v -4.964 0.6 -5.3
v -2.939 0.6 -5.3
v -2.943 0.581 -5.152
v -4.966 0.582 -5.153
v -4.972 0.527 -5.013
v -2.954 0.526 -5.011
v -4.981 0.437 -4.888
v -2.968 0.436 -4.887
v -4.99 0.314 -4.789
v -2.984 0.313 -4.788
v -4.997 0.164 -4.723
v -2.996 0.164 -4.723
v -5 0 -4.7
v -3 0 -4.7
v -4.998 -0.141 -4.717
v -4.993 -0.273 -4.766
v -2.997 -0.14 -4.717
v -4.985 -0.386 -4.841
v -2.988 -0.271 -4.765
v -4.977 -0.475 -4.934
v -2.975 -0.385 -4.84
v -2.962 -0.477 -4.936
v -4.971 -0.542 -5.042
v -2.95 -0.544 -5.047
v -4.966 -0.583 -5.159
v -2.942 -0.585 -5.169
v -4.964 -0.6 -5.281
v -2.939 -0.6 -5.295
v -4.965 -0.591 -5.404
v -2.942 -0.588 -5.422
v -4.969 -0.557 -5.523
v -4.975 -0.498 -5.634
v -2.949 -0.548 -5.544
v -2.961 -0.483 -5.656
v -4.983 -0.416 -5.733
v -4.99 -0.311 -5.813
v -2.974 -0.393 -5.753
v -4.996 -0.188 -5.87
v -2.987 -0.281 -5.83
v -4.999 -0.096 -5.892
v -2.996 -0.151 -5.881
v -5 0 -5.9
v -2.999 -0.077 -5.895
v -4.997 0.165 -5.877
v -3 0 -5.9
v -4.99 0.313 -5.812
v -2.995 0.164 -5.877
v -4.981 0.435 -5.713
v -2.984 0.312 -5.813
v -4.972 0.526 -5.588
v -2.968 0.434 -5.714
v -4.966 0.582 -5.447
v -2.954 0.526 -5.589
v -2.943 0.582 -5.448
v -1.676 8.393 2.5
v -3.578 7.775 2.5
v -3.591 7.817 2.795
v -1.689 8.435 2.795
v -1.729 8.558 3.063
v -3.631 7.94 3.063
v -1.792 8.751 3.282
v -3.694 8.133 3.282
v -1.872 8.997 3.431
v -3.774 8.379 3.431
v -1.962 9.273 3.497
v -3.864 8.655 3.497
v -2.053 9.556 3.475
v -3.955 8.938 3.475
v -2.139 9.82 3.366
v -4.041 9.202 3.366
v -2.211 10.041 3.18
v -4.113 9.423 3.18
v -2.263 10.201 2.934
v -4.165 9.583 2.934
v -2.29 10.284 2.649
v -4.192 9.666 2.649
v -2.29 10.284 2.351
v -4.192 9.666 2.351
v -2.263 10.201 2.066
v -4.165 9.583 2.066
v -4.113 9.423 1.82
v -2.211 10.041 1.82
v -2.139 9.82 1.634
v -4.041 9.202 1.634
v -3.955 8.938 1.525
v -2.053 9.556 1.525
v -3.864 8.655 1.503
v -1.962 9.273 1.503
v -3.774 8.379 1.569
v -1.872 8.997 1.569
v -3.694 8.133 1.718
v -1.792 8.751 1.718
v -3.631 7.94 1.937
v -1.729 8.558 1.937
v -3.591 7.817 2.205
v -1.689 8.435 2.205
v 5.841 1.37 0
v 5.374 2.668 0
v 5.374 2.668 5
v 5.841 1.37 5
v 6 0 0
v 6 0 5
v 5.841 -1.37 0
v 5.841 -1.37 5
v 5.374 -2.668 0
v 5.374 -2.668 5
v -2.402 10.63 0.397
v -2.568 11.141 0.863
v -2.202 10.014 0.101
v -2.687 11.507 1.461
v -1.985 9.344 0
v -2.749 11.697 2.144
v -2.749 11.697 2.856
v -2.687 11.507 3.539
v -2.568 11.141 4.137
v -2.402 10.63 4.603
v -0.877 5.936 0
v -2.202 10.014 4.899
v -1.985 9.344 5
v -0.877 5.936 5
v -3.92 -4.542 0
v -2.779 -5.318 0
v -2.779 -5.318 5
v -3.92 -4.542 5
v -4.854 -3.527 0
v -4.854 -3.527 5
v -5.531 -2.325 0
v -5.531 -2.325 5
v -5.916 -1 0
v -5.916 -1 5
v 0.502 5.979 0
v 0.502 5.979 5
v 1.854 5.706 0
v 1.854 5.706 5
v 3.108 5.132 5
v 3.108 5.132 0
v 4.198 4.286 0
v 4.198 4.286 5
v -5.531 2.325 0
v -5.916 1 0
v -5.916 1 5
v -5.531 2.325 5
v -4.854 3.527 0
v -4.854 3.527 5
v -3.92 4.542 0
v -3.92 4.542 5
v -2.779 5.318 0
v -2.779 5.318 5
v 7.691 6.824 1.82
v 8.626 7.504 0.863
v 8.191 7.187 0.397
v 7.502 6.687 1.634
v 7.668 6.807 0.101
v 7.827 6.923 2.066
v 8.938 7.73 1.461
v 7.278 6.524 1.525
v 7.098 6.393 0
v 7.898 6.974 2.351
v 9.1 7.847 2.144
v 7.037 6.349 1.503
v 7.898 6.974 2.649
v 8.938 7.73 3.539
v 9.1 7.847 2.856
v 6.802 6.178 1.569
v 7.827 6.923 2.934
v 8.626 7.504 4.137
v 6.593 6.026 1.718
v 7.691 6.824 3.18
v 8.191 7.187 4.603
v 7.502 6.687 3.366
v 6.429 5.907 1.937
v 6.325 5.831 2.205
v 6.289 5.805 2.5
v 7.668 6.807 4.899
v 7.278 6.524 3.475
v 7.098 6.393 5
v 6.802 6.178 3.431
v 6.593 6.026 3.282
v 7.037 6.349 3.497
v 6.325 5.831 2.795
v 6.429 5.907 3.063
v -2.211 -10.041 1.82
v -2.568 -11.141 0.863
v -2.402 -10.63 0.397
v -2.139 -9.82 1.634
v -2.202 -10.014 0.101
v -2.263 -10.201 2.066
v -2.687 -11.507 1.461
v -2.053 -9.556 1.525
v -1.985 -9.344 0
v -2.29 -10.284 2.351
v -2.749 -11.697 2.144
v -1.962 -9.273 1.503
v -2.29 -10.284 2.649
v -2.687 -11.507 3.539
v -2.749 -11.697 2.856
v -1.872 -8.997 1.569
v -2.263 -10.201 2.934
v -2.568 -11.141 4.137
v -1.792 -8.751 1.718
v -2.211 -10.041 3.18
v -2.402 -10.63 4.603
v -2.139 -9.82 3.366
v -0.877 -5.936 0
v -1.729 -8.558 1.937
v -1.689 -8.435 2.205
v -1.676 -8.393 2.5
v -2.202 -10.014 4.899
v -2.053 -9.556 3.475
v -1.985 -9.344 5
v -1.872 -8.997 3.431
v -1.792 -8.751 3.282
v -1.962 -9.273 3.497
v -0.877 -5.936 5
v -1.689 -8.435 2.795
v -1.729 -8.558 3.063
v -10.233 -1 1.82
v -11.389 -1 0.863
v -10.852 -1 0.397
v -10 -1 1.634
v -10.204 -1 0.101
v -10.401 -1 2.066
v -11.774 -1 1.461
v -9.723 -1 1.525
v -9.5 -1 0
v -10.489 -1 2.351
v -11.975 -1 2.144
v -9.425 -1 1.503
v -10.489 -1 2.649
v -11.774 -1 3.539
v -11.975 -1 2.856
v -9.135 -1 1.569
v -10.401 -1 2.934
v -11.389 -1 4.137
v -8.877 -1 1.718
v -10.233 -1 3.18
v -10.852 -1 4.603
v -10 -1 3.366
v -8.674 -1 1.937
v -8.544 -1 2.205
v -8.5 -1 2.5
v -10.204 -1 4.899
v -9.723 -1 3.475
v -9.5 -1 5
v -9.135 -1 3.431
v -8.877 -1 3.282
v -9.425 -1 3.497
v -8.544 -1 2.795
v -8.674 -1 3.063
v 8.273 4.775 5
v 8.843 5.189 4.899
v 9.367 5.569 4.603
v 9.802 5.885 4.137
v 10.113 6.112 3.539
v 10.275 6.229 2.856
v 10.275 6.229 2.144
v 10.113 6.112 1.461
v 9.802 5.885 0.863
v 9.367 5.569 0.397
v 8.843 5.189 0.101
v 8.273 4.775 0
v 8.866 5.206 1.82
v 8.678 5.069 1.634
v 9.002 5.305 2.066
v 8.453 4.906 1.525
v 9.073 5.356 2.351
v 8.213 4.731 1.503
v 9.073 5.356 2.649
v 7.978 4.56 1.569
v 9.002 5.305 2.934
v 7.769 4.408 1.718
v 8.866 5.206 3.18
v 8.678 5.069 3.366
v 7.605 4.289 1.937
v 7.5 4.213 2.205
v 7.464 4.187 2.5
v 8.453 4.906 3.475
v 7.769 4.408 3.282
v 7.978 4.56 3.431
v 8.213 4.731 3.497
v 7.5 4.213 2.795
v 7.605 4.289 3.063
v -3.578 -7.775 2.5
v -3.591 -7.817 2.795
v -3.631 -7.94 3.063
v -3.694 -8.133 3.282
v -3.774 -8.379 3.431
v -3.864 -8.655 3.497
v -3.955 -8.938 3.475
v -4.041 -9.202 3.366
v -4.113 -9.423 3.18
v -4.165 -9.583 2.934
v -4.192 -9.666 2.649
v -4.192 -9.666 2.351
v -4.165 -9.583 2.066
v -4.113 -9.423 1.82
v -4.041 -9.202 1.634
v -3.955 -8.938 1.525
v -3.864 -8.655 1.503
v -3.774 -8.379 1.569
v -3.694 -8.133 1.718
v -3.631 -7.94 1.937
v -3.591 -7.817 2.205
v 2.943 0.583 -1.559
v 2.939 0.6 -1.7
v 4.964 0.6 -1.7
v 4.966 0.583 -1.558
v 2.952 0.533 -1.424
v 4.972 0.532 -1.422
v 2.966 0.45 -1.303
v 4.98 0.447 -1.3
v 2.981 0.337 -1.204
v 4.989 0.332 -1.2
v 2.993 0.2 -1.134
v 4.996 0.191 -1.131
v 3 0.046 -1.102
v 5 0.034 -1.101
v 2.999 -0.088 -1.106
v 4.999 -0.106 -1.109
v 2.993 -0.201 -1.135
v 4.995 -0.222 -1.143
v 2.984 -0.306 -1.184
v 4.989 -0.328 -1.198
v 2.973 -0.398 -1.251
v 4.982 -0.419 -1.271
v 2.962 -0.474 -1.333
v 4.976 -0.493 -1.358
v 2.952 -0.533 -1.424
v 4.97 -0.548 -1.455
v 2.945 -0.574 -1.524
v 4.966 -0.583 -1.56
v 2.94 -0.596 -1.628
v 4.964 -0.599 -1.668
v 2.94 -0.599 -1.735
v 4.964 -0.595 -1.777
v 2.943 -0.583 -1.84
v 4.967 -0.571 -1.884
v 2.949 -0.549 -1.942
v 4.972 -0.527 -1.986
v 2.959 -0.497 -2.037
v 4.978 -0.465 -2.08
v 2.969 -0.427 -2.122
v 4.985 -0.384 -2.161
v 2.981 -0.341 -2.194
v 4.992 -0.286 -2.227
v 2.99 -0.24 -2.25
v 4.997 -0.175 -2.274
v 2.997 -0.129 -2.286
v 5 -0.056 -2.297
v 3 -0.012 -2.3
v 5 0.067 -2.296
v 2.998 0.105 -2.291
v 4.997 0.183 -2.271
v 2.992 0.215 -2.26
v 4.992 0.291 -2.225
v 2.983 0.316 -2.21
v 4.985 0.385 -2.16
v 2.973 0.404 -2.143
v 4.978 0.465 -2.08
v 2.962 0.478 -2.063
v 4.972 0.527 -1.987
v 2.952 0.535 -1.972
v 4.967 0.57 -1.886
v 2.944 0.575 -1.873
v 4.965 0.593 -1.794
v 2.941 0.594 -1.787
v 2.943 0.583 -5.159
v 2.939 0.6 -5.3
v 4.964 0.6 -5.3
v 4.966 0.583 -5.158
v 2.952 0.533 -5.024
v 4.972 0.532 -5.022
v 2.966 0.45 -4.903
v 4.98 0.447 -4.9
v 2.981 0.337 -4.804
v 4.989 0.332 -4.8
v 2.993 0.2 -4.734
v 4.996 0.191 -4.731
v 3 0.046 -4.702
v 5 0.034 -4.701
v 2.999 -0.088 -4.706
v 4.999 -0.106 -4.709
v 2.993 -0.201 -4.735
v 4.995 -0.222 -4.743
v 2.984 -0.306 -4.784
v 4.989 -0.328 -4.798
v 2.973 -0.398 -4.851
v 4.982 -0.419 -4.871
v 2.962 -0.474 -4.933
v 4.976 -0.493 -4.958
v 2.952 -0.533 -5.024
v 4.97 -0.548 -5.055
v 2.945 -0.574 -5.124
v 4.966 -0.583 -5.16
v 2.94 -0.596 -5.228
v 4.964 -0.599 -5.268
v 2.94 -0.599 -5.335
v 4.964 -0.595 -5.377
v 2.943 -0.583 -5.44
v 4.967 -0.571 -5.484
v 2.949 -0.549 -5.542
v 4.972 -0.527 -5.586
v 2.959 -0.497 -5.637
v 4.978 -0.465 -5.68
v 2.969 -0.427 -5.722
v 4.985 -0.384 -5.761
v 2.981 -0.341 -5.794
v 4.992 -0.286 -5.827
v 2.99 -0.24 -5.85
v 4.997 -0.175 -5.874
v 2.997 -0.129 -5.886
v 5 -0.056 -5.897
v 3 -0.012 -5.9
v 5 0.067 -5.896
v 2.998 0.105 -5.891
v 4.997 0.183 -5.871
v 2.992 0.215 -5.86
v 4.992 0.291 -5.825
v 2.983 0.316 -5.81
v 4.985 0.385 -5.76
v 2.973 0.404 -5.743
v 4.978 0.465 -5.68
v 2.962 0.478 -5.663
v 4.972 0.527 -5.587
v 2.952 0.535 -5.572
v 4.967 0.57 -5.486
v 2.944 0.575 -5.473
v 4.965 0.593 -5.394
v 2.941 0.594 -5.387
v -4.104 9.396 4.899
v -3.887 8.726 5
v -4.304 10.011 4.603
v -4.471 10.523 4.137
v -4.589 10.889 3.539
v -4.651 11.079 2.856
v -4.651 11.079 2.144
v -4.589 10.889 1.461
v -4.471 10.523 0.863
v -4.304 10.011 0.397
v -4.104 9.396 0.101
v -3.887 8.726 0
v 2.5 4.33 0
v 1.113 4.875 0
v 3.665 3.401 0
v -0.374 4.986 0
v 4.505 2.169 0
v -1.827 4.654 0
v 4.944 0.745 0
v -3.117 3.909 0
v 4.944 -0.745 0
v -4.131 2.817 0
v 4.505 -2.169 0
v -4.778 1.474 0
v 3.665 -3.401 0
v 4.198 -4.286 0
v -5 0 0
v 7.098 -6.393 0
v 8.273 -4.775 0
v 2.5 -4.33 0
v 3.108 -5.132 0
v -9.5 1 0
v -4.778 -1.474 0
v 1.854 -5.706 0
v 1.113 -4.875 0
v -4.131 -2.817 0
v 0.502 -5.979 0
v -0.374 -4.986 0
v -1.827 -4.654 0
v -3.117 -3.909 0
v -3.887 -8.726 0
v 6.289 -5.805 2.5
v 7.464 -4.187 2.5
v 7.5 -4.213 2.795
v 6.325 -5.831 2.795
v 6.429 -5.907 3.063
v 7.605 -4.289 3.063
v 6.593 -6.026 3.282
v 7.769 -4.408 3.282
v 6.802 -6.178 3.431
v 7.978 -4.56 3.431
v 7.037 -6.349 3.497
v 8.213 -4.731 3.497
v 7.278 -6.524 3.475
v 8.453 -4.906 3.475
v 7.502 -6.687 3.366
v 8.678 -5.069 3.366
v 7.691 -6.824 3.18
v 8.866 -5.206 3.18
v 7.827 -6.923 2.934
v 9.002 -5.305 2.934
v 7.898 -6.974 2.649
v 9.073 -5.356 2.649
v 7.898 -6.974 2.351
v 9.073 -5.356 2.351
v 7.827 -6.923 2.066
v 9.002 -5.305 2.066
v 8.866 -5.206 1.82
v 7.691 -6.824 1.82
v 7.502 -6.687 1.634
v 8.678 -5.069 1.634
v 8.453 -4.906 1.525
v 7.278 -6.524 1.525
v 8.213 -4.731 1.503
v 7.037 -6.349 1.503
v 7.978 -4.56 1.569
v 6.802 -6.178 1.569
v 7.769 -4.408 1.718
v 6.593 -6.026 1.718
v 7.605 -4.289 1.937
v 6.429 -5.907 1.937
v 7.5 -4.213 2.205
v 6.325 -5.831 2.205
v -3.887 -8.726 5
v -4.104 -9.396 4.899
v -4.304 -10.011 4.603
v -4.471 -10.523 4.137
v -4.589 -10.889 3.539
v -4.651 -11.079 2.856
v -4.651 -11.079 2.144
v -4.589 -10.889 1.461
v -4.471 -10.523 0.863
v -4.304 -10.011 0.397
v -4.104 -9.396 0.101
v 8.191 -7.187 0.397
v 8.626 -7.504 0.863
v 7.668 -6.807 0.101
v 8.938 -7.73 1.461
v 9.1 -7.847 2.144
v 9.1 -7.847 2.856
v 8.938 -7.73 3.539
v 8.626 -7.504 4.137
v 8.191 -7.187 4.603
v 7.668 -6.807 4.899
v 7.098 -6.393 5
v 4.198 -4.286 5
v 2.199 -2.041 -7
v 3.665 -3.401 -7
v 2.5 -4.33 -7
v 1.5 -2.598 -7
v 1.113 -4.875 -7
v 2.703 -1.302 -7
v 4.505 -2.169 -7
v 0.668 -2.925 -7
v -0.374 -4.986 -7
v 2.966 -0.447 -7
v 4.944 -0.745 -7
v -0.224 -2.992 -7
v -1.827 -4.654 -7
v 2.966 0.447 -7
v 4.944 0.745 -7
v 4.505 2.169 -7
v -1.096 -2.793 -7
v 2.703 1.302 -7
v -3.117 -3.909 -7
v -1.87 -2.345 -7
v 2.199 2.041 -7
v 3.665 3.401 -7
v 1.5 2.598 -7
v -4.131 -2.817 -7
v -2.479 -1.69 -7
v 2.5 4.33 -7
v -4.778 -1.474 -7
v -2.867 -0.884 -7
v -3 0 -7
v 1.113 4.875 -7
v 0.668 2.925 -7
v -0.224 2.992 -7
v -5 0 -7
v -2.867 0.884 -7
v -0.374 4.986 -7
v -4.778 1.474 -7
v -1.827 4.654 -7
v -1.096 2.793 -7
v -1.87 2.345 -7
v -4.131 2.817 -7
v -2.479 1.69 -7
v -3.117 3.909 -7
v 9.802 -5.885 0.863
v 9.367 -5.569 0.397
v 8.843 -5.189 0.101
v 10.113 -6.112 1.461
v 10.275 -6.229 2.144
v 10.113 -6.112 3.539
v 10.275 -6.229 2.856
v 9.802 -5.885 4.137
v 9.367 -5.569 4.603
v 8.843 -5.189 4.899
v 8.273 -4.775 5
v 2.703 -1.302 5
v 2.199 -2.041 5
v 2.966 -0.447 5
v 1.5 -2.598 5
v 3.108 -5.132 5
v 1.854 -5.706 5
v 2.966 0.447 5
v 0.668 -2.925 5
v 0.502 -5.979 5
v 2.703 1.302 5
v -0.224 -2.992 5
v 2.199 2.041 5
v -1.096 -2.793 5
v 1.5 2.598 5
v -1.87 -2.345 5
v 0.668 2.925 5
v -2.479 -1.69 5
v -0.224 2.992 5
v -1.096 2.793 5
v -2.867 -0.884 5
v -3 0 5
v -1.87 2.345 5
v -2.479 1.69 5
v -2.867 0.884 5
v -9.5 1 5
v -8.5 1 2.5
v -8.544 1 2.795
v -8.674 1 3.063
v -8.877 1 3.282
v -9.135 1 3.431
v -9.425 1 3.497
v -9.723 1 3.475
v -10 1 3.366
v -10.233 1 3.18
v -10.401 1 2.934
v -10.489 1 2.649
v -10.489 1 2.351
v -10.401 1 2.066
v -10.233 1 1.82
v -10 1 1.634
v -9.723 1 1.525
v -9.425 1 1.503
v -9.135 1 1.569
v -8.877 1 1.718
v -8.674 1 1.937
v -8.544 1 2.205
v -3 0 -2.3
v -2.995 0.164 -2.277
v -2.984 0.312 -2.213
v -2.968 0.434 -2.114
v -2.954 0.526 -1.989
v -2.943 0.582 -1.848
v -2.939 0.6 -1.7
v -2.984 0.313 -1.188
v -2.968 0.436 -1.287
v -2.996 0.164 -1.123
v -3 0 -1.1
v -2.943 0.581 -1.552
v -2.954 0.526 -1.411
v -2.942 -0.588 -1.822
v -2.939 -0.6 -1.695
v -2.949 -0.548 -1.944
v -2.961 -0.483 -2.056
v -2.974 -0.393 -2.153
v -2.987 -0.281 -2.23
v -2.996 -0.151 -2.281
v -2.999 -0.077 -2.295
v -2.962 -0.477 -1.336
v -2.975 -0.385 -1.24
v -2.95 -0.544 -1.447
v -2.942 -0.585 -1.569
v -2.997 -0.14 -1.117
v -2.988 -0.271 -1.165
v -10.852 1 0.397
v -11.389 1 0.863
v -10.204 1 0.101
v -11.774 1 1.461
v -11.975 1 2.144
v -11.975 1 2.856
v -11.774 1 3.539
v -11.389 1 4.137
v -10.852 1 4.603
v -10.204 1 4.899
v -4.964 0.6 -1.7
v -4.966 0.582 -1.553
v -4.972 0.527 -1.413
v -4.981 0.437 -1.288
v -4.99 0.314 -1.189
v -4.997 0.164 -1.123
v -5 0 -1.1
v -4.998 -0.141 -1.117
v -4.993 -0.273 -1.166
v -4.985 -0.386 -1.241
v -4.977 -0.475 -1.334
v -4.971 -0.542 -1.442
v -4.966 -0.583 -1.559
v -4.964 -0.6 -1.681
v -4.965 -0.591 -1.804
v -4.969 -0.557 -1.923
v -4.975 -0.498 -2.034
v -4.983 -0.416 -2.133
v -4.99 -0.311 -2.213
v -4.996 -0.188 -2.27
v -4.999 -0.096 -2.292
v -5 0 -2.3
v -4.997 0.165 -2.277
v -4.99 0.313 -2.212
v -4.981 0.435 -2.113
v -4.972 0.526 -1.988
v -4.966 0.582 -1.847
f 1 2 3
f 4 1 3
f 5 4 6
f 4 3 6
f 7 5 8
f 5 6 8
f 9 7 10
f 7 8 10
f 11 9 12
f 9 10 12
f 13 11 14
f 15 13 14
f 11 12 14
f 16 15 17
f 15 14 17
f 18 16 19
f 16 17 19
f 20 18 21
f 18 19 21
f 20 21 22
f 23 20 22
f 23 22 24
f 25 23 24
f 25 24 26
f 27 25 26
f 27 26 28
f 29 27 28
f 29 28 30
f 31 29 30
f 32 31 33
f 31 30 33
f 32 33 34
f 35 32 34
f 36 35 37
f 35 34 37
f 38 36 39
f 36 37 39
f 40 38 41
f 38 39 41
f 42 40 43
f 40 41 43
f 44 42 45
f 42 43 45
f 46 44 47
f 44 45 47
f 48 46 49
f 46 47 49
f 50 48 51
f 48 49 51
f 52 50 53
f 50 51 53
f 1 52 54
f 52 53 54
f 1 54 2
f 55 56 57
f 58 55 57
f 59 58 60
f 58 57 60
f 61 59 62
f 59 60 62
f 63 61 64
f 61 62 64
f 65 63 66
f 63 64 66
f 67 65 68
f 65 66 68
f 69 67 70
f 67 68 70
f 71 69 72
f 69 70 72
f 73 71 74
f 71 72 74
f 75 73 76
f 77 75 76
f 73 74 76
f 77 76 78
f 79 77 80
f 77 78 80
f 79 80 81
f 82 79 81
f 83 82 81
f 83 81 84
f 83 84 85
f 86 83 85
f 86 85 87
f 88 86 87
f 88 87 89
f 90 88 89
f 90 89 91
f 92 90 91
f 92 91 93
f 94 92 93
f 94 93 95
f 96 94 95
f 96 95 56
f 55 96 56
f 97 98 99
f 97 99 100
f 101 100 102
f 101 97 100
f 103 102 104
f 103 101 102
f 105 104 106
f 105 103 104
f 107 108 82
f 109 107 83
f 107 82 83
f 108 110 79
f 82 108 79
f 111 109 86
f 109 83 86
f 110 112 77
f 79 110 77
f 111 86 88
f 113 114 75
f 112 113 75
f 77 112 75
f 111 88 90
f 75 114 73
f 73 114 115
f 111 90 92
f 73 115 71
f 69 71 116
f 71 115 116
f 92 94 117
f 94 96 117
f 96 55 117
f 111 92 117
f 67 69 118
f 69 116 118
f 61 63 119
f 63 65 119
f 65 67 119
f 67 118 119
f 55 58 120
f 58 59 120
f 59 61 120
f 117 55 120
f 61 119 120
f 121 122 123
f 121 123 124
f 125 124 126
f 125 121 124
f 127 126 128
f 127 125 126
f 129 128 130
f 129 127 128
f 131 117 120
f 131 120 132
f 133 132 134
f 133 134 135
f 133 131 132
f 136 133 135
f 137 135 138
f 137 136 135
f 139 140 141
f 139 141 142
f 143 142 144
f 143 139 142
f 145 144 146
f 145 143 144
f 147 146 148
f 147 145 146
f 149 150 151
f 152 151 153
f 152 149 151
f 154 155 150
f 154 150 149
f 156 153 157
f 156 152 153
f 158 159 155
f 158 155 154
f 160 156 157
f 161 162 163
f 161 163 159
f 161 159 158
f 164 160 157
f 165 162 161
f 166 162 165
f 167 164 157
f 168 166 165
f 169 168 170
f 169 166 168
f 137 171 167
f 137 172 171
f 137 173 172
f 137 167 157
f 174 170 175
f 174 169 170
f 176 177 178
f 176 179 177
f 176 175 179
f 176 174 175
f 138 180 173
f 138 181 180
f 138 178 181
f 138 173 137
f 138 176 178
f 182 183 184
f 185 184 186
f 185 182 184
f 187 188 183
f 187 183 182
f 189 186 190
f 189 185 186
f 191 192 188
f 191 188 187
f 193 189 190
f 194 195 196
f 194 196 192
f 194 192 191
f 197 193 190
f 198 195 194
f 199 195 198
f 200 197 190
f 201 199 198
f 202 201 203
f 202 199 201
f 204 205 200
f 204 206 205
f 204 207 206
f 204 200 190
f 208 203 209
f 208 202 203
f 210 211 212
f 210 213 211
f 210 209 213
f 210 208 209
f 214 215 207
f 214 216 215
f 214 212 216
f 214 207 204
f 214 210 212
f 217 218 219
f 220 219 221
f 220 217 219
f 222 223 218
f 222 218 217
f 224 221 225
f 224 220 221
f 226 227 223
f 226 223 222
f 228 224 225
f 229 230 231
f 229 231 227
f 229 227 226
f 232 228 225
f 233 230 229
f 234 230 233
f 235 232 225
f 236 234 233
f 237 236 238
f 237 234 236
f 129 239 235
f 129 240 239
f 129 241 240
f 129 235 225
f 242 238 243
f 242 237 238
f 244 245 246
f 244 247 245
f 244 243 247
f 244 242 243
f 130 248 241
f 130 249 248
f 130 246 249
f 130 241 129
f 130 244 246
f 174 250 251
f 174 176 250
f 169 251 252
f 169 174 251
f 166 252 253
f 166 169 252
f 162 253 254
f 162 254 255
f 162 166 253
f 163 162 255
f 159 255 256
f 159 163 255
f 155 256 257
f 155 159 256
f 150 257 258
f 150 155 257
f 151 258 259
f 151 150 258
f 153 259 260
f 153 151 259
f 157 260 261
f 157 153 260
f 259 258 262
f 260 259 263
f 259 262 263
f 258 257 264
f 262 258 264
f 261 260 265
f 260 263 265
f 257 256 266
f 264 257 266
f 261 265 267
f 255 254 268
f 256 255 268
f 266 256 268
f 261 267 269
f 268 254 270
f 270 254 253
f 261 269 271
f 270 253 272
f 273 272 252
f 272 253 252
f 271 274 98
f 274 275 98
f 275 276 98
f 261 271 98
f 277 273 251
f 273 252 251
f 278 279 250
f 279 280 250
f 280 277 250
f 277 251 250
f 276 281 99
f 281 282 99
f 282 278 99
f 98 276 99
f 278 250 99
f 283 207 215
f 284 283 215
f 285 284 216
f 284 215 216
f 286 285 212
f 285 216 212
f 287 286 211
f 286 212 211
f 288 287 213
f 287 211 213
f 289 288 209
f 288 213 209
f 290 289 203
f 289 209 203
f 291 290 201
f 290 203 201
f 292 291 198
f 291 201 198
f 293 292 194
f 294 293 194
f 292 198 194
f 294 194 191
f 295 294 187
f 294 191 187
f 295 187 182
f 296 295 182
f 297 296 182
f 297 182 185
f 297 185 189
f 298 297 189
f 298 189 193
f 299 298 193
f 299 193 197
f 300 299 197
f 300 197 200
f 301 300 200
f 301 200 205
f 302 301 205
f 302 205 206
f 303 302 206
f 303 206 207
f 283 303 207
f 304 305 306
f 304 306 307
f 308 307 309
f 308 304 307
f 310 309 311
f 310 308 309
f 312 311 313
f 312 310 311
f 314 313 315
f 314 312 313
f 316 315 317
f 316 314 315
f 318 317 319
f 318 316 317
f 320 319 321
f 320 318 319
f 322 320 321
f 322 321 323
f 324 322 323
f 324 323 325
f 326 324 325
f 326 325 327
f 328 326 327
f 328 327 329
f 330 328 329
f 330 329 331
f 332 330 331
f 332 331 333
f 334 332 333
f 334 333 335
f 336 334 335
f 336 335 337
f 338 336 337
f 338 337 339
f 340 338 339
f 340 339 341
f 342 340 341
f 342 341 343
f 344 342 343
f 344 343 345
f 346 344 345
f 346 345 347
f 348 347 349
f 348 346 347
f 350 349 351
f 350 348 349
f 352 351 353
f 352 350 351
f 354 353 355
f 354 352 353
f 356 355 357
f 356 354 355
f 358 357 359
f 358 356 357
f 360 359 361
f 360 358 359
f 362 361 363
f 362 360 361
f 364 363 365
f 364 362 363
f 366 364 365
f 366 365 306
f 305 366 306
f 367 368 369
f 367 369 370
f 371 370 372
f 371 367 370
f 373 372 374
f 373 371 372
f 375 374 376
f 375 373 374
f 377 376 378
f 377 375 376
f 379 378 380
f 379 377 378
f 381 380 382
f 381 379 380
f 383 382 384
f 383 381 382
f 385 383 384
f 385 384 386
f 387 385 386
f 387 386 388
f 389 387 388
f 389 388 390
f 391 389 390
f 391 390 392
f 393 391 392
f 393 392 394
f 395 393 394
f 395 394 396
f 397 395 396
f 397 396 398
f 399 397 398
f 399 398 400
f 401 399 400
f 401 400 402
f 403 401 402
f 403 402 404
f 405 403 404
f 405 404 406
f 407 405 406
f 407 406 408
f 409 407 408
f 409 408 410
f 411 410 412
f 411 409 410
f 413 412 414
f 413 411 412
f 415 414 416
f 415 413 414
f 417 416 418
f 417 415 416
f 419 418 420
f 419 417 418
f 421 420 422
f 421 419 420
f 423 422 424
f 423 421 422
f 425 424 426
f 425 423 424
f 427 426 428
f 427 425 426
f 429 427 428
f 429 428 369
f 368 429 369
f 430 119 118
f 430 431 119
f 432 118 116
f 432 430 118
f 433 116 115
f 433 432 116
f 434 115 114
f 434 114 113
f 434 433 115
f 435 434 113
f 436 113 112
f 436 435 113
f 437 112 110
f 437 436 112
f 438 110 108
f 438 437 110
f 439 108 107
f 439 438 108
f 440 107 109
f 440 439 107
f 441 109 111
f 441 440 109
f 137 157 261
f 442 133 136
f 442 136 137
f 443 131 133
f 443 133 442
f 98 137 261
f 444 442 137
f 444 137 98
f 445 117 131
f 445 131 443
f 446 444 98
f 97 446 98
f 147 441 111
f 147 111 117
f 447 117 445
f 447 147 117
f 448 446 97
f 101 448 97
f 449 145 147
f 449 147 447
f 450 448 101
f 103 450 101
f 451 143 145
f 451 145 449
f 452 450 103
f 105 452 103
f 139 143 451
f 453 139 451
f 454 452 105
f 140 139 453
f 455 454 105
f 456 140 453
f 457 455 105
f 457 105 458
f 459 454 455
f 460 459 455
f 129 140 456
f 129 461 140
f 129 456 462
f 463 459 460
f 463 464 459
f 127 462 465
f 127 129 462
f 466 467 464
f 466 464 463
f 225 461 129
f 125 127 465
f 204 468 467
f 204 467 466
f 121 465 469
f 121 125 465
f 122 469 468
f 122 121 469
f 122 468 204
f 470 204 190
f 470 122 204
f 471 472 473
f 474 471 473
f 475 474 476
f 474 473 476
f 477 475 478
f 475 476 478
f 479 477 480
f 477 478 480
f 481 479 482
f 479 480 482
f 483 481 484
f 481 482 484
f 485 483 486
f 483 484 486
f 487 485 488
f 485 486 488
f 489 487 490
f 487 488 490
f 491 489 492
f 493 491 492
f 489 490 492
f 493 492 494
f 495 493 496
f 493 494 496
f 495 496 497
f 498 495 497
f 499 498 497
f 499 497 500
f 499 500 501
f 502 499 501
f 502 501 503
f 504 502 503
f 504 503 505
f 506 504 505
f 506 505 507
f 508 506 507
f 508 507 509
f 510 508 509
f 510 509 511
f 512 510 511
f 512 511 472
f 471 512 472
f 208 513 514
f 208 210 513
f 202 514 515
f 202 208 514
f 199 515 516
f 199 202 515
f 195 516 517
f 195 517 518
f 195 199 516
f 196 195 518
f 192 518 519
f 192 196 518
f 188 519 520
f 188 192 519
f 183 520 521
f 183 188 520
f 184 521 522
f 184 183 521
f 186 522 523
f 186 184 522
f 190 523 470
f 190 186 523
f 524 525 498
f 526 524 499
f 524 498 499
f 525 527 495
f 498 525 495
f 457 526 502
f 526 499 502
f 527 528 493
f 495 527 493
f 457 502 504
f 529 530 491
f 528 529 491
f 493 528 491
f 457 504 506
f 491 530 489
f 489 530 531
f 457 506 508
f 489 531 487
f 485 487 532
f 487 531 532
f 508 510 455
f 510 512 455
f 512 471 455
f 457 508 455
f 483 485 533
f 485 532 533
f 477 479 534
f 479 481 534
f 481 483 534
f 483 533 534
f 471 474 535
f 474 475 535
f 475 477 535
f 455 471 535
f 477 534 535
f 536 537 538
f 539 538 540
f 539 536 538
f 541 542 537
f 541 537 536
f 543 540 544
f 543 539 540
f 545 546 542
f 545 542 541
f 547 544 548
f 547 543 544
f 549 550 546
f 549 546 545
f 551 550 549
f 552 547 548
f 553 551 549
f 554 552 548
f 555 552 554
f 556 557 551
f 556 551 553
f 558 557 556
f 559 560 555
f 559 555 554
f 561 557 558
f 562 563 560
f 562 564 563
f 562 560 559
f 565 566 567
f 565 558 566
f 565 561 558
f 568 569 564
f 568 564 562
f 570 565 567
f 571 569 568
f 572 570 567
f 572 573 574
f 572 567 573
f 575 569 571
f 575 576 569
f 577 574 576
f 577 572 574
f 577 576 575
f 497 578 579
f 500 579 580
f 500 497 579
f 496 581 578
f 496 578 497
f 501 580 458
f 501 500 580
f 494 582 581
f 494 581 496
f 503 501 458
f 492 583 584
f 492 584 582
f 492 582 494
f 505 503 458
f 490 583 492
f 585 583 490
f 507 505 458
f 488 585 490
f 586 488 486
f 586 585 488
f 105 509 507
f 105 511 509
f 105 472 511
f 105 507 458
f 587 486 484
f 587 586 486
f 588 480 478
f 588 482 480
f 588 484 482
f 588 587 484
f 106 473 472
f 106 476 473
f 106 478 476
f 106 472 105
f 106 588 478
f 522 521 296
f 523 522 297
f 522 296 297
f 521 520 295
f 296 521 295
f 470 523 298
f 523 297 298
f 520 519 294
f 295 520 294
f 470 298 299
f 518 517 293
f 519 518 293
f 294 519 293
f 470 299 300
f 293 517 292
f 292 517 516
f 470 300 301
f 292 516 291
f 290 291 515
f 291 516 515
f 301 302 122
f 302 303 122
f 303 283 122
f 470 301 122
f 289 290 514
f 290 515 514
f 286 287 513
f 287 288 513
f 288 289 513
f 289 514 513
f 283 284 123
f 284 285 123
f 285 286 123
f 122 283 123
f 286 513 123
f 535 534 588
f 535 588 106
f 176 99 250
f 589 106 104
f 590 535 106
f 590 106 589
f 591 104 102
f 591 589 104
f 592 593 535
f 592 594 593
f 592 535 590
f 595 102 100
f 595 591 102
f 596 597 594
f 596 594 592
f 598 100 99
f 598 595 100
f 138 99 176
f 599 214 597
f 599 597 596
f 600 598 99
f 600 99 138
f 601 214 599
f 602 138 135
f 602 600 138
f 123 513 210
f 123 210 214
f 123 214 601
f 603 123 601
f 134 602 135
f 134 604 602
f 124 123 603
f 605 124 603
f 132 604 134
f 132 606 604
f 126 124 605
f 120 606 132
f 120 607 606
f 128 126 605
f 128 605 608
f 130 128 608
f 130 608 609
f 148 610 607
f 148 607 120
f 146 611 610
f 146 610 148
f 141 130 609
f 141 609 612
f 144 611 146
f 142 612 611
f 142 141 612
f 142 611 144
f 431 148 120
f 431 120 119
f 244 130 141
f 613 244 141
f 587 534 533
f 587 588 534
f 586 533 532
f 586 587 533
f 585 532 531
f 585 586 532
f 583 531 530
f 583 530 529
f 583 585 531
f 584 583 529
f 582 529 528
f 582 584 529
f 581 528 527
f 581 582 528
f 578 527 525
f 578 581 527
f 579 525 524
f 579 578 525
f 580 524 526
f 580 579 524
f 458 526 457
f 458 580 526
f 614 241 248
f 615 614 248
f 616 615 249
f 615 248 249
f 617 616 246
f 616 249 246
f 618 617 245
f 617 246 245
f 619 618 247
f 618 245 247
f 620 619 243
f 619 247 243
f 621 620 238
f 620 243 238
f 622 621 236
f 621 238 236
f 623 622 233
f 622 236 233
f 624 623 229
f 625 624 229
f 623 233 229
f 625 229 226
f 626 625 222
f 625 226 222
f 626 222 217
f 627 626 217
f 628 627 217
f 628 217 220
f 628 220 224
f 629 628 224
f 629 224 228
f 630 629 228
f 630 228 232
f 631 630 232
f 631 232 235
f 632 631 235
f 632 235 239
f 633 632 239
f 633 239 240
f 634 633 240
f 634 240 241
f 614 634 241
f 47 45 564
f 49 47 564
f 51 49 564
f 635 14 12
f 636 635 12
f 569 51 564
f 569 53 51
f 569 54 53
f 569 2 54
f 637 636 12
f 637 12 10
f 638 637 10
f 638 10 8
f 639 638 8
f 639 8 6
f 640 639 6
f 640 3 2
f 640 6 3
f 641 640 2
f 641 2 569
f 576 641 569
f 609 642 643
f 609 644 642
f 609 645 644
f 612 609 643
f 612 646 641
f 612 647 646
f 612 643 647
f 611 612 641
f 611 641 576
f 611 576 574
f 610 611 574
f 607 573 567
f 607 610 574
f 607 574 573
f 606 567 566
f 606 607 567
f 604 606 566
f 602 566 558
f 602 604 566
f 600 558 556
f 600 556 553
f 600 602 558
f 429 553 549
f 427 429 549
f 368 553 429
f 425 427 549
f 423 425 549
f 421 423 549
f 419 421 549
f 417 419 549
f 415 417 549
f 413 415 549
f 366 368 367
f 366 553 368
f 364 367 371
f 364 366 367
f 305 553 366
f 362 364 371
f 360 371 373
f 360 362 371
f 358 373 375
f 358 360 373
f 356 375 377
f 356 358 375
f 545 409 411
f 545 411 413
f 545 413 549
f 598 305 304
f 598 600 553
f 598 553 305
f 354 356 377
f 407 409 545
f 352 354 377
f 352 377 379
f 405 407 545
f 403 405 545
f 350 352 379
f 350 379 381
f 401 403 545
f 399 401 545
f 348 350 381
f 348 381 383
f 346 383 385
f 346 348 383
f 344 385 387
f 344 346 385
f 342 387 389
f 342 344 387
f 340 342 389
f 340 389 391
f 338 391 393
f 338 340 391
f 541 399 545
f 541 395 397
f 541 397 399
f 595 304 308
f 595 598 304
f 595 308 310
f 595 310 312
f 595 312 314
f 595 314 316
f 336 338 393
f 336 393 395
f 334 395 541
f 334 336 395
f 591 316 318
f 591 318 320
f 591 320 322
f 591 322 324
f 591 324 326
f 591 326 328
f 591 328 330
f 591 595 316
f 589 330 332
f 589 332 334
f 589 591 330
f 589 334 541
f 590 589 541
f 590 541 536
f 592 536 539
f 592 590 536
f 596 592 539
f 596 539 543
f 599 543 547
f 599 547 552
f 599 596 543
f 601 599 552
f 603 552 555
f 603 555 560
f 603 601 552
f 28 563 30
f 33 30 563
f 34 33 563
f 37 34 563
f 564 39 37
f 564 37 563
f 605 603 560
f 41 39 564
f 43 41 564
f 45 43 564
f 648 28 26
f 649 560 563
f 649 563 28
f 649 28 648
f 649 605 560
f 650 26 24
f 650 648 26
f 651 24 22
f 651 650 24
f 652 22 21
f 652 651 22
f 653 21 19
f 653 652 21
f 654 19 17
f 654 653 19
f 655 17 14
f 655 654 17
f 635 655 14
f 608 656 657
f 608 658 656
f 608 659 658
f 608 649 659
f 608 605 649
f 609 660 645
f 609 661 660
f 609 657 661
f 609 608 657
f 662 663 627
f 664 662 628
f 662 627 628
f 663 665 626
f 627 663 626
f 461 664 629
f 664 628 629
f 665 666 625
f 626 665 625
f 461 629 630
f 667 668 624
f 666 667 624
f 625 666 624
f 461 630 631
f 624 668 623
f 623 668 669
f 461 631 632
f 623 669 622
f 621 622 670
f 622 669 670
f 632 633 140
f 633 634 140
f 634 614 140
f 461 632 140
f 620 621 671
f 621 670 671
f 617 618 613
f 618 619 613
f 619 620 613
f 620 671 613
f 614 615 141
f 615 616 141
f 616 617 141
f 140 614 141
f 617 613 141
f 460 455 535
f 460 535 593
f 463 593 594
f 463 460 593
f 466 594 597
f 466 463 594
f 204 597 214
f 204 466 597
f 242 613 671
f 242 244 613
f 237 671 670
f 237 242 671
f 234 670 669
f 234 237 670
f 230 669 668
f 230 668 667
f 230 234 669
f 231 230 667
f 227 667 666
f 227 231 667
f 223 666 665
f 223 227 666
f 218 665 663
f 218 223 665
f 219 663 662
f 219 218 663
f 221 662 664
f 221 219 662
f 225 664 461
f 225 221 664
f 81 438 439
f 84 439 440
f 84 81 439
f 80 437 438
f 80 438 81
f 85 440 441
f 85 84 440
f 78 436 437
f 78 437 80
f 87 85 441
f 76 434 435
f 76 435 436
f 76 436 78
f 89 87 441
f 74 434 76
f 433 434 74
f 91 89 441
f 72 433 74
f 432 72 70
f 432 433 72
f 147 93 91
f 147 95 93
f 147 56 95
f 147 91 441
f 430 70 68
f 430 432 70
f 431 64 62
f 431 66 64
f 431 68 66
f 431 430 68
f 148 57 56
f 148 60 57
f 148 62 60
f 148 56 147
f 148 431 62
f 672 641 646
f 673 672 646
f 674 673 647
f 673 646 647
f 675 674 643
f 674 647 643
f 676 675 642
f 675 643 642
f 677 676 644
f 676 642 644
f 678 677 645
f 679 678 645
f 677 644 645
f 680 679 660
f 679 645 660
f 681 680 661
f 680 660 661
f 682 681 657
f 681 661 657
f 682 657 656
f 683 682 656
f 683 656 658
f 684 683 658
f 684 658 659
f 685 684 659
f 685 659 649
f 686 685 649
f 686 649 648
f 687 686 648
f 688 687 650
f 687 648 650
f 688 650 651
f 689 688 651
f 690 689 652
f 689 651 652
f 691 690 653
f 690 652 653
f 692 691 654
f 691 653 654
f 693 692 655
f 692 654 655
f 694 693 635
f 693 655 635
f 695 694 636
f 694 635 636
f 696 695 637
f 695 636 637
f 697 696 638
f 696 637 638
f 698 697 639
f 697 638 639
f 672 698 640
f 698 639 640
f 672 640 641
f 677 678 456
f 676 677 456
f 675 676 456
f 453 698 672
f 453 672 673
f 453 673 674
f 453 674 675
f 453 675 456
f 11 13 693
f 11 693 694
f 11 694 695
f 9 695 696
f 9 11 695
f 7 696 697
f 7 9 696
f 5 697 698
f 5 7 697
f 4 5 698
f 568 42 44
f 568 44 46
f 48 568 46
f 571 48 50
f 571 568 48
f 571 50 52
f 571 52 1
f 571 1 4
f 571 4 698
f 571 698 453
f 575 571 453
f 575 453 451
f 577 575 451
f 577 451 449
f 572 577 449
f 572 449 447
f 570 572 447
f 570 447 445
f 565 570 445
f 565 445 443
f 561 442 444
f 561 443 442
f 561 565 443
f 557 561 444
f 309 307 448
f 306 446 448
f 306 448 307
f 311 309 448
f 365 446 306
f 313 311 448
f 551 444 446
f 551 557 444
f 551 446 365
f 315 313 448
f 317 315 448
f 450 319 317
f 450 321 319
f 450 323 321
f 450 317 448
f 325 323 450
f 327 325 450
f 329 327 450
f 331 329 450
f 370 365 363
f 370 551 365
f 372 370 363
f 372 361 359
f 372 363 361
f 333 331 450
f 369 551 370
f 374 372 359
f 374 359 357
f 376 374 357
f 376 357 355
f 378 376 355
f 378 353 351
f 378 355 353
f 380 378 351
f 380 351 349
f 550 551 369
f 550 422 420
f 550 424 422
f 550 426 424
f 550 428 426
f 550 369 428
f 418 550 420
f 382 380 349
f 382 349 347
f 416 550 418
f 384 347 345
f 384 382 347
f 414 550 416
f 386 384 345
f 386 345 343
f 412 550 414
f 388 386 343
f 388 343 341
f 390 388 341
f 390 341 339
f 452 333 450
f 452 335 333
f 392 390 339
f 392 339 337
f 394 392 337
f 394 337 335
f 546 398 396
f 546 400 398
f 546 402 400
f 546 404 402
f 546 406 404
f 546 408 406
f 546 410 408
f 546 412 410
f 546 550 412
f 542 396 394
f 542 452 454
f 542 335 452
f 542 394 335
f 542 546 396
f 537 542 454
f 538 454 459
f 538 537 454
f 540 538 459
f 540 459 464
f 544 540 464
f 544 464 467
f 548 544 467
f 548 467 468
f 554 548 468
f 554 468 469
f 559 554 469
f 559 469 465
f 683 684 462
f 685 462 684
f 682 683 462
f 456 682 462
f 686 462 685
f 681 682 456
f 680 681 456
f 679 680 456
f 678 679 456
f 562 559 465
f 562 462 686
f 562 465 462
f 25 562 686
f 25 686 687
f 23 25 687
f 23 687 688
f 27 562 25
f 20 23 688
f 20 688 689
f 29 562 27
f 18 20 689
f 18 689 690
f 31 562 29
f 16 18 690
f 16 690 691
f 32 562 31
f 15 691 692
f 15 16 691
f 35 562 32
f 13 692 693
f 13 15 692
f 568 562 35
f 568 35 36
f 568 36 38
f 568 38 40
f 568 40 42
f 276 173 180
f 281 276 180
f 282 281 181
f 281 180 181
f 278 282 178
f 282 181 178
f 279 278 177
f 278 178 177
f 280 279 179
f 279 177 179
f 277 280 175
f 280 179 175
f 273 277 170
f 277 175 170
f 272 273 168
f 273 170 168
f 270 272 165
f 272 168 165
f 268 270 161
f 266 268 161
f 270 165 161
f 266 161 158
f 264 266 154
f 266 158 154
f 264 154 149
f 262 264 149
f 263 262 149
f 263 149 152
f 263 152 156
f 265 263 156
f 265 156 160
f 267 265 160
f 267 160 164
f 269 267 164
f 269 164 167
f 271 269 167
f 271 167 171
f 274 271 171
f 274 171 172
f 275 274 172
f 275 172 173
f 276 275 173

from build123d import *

# Parameters (mm, degrees)
F3_DEPTH      = 1
F4_R          = 1
F5_DEPTH      = 7.001
F6_COUNT      = 5
F7_R          = 0.6
F8_DEPTH      = 12.001
F8_DEPTH_BACK = 10.2969891848


with BuildPart() as f1:
    # F0 (on Front) → F1 (revolve)
    with BuildSketch(Plane.XZ):
        Polygon((-3, -7), (-3, 5), (-6, 5), (-6, 0), (-5, 0), (-5, -7), align=None)
    revolve(axis=Axis((0, 0, -4.9457359128), (0, 0, -1)))

    # F2 (on Front) → F3 (join, symmetric)
    with BuildSketch(Plane.XZ):
        with BuildLine():
            ThreePointArc((-7, 2.5), (-7.732233047, 4.267766953), (-9.5, 5))
            ThreePointArc((-9.5, 5), (-12, 2.5), (-9.5, 0))
            ThreePointArc((-9.5, 0), (-7.732233047, 0.732233047), (-7, 2.5))
        make_face()
        with BuildLine():
            Line((-5, 5), (-9.5, 5))
            ThreePointArc((-9.5, 5), (-7.732233047, 4.267766953), (-7, 2.5))
            ThreePointArc((-7, 2.5), (-7.732233047, 0.732233047), (-9.5, 0))
            Line((-9.5, 0), (-5, 0))
            Line((-5, 0), (-5, 5))
        make_face()
    extrude(amount=F3_DEPTH, both=True)

    # F4 (on face) → F5 (cut, through all)
    with BuildSketch(Plane.XZ.offset(1)):
        with Locations((-9.5, 2.5)):
            Circle(F4_R)
    extrude(amount=-F5_DEPTH, mode=Mode.SUBTRACT)

    # F6: F1 ×5 about axis
    f6_axis = Axis((0, 0, -7), (0, 0, 1))


with BuildPart() as f1_1:
    add(f1.part)
    for i in range(1, F6_COUNT):
        add(f1.part.rotate(f6_axis, i * 360 / F6_COUNT))

    # F7 (on Right) → F8 (cut, two sides)
    with BuildSketch(Plane.YZ) as f8_sk:
        with Locations((0, -1.7)):
            Circle(F7_R)
        with Locations((0, -5.3)):
            Circle(F7_R)
    extrude(amount=-F8_DEPTH, mode=Mode.SUBTRACT)
    extrude(f8_sk.sketch, amount=F8_DEPTH_BACK, mode=Mode.SUBTRACT)


solid = f1_1.part
